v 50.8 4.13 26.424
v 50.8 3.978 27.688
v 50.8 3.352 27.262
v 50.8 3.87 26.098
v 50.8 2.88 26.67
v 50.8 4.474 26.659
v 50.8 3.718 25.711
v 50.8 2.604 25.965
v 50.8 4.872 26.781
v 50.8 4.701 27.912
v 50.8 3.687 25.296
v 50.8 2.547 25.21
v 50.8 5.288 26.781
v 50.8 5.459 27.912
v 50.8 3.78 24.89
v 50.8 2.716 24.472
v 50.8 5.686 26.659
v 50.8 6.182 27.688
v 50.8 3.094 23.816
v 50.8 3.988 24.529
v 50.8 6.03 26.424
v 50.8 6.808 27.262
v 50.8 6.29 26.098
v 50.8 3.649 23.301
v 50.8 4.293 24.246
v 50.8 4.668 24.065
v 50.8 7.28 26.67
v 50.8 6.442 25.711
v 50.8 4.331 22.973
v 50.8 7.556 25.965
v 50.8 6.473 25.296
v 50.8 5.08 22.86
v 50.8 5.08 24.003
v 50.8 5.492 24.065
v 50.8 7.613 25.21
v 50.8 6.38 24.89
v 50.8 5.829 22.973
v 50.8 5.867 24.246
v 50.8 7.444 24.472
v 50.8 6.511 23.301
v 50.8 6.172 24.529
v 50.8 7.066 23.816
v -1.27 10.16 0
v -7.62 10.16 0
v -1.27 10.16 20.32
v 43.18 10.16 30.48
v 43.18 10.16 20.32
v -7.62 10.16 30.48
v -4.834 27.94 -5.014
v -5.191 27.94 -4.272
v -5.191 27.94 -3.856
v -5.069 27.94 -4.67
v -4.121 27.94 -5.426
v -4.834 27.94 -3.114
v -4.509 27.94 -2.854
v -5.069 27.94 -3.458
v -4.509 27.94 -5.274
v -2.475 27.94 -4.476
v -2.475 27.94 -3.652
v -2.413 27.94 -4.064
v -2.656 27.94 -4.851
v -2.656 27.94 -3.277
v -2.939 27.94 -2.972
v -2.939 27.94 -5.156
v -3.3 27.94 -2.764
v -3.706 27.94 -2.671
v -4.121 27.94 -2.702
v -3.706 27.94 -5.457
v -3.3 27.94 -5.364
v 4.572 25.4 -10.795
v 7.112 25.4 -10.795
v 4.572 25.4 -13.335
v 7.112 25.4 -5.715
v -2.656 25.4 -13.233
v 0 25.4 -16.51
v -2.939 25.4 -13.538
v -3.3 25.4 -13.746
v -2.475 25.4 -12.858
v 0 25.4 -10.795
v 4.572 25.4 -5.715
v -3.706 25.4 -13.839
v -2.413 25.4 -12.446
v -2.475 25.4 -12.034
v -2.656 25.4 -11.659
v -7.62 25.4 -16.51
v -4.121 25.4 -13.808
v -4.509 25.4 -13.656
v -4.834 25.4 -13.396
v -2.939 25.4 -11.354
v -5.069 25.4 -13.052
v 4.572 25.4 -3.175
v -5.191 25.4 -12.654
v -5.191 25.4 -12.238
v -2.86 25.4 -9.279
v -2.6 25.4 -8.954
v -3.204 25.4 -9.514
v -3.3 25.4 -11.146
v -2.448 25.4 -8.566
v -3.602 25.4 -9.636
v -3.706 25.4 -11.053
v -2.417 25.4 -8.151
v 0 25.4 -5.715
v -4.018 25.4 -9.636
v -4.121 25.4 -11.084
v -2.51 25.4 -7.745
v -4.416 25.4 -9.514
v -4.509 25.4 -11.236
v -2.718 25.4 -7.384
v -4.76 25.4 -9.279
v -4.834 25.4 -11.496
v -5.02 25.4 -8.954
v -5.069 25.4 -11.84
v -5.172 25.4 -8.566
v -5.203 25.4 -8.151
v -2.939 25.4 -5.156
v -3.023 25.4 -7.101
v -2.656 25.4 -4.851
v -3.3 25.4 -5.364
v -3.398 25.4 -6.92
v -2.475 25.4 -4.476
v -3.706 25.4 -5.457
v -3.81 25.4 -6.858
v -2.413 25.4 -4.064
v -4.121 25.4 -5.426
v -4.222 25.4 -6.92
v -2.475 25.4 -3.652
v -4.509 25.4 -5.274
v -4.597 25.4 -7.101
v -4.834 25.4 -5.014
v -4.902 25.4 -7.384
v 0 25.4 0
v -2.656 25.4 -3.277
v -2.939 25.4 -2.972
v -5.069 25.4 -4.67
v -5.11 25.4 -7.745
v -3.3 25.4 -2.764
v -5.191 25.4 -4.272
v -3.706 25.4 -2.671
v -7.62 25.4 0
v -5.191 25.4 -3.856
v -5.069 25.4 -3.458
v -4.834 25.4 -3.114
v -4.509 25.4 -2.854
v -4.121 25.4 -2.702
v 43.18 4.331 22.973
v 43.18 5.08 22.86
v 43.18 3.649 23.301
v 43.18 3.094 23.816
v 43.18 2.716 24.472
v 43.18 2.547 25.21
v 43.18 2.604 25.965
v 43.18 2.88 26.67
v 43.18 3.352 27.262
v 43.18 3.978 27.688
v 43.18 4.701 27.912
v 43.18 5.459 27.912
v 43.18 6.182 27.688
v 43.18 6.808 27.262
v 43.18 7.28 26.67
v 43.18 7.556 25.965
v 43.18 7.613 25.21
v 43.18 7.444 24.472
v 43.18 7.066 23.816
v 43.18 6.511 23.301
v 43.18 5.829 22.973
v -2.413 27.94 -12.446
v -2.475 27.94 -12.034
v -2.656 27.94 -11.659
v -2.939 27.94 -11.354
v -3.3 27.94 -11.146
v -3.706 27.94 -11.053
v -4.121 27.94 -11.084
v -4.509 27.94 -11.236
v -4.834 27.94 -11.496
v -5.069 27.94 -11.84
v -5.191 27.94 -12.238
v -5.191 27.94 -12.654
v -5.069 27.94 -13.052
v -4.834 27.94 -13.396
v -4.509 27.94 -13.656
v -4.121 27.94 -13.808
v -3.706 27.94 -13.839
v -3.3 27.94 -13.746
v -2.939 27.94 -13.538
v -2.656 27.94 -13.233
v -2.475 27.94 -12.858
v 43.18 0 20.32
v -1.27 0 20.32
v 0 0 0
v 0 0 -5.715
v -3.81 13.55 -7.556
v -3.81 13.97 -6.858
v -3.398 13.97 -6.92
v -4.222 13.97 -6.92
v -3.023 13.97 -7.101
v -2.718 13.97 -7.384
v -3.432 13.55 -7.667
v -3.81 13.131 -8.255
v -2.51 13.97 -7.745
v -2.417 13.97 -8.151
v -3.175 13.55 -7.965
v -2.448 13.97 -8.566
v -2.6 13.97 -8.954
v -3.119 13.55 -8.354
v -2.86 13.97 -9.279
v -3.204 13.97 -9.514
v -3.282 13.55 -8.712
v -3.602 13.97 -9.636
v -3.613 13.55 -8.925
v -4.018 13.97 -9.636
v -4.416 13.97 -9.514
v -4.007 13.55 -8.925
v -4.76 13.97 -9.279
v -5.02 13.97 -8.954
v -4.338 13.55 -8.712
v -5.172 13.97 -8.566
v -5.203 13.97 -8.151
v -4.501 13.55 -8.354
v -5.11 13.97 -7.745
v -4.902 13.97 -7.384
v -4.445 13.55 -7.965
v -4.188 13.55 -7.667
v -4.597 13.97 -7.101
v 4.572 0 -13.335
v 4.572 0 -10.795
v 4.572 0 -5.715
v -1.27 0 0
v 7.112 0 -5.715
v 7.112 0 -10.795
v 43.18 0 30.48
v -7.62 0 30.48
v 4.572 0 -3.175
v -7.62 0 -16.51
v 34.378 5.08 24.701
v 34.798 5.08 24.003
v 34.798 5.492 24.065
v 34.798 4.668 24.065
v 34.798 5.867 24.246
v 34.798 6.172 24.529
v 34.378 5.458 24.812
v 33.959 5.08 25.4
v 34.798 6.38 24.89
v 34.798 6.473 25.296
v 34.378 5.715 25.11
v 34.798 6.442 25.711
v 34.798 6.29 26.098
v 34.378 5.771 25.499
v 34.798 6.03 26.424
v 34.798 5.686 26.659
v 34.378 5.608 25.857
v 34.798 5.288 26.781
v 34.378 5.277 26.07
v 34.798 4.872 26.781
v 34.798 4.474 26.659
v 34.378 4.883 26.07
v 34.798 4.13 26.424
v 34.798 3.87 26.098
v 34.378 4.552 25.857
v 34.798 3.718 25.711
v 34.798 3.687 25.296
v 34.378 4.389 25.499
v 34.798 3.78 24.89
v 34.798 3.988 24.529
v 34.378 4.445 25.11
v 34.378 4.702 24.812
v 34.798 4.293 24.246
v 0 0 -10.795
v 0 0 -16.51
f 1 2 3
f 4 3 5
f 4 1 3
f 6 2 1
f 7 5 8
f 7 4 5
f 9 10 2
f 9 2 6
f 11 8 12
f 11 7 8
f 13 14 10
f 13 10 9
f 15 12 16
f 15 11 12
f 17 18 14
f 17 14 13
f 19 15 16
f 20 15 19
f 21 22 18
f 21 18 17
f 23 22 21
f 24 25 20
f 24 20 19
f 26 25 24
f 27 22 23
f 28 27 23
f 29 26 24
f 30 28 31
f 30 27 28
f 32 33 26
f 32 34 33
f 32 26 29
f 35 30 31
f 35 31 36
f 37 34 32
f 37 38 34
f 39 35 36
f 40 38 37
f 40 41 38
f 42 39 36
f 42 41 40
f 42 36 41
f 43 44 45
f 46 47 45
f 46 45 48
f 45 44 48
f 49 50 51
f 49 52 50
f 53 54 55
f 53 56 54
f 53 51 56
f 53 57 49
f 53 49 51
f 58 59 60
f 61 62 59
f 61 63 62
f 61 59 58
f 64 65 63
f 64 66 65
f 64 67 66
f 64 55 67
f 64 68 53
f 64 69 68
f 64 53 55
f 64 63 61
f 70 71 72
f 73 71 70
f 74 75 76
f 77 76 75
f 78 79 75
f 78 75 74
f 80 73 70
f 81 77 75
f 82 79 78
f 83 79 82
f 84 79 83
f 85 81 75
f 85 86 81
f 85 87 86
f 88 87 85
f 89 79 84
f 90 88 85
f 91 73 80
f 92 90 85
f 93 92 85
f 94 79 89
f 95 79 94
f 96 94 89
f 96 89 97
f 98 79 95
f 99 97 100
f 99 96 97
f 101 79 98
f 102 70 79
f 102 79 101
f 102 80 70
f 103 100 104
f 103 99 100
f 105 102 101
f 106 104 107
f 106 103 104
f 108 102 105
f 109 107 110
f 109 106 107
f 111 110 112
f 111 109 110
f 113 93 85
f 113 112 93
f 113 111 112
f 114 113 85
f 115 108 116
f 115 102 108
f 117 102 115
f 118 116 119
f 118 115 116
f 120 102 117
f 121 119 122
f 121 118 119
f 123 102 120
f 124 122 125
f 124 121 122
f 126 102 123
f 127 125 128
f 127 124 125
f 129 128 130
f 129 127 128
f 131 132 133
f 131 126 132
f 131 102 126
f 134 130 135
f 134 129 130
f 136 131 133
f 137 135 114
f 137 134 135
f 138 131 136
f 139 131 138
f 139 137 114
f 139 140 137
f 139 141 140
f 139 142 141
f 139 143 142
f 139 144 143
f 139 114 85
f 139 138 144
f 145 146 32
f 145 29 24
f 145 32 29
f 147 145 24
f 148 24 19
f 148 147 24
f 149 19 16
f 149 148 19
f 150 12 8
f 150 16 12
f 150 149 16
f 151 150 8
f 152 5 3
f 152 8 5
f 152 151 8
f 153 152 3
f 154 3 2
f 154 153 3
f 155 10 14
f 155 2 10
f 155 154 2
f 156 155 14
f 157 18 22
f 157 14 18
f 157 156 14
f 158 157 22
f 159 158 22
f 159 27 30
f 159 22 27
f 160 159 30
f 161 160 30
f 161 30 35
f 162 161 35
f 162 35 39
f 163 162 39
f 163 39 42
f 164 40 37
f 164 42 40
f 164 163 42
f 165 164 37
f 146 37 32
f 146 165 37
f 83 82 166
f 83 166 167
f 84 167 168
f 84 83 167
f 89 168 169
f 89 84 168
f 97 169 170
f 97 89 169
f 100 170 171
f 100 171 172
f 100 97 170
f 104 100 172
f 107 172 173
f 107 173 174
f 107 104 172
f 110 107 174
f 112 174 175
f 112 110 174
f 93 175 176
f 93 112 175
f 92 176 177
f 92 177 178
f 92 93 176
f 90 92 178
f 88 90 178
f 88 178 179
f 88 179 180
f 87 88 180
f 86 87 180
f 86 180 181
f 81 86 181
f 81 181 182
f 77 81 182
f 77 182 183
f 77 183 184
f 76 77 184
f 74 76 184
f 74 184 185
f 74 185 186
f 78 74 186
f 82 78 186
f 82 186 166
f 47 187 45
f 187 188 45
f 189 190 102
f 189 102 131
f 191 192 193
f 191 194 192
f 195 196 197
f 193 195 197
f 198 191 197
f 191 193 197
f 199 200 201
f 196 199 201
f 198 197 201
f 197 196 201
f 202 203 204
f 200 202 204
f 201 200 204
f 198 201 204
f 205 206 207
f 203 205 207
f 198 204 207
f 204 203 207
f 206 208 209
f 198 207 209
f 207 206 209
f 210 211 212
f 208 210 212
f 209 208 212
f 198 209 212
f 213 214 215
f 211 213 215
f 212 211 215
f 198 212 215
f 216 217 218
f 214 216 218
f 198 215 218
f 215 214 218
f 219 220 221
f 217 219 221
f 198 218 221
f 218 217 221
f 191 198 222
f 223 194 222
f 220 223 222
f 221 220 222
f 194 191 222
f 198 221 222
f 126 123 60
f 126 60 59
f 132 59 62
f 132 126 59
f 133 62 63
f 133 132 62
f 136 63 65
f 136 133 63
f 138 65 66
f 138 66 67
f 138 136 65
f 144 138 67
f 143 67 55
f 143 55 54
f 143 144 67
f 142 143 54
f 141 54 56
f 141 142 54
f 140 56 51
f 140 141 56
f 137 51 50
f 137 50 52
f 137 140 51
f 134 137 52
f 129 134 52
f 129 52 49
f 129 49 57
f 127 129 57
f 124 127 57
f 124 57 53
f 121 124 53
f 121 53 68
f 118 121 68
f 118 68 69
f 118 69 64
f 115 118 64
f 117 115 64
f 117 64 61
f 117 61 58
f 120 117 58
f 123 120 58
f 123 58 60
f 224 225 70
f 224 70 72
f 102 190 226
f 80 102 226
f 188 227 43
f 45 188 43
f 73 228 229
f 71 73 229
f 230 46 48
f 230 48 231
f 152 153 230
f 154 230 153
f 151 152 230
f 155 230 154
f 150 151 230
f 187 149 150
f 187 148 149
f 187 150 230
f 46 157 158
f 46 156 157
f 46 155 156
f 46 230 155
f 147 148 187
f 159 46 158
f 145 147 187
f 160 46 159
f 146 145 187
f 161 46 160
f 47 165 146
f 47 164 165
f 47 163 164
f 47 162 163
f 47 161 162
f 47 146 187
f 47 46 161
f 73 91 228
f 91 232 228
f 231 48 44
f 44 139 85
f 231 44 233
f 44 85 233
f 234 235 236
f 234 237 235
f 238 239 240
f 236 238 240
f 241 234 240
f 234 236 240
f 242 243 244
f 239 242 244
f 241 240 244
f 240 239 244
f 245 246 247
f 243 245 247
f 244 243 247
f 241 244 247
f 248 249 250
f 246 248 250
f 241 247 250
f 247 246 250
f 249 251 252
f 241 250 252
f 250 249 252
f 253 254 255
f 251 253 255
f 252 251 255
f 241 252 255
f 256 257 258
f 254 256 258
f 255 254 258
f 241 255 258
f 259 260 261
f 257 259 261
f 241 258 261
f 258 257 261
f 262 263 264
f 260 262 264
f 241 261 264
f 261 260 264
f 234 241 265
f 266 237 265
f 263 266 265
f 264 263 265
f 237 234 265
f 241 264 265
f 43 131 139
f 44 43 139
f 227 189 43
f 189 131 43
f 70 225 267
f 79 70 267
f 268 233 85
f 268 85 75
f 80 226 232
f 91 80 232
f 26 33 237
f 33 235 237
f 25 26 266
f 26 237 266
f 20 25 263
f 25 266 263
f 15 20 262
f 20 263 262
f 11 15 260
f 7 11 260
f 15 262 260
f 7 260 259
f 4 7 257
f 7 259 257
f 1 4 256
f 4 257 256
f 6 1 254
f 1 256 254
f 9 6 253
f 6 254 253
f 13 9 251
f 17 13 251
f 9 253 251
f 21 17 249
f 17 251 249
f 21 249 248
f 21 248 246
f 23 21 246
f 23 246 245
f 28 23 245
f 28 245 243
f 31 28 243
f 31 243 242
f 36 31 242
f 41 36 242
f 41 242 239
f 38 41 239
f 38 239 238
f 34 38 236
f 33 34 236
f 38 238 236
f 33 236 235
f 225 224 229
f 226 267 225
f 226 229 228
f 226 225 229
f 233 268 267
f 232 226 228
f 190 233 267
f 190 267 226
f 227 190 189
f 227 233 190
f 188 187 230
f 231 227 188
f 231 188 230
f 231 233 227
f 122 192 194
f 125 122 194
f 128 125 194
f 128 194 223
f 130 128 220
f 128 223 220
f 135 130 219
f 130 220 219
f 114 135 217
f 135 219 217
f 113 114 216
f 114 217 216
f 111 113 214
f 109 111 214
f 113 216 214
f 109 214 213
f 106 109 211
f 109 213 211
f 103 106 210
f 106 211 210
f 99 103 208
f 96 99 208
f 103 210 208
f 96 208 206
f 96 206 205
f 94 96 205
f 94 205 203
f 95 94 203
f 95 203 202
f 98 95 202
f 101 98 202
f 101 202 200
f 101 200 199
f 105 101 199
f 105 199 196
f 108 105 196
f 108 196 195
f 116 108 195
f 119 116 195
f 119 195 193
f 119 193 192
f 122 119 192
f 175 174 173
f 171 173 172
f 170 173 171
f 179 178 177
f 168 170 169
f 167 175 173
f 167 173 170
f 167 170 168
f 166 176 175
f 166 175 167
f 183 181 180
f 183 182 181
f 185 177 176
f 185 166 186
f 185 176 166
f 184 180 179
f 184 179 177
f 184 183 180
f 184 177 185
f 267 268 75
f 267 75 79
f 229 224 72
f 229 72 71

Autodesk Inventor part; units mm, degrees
ref_plane "YZ Plane" through (0, 0, 0) normal (1, 0, 0) x (0, 1, 0)
ref_plane "XZ Plane" through (0, 0, 0) normal (0, 1, 0) x (-1, 0, 0)
ref_plane "XY Plane" through (0, 0, 0) normal (0, 0, 1) x (1, 0, 0)
sketch "Sketch1" plane through (0, 0, 0) normal (0, 1, 0) x (-1, 0, 0)
  line L0 (0, 0) -> (7.62, 0)
  line L1 (7.62, 0) -> (7.62, -16.51)
  line L2 (7.62, -16.51) -> (0, -16.51)
  line L3 (0, -16.51) -> (0, 0)
  line L4 (0, 0) -> (0, -5.715)
  line L5 (0, -5.715) -> (-7.112, -5.715)
  line L6 (-7.112, -5.715) -> (-7.112, -10.795)
  line L7 (-7.112, -10.795) -> (0, -10.795)
  line L8 (-7.112, -5.715) -> (-4.572, -5.715)
  line L9 (-4.572, -5.715) -> (-4.572, -3.175)
  line L10 (-4.572, -3.175) -> (-7.112, -5.715)
  line L11 (-7.112, -10.795) -> (-4.572, -10.795)
  line L12 (-4.572, -10.795) -> (-4.572, -13.335)
  line L13 (-4.572, -13.335) -> (-7.112, -10.795)
  dimension "d0" = 7.62
  dimension "d1" = 16.51
  dimension "d2" = 5.715
  dimension "d3" = 7.112
  dimension "d4" = 5.08
  dimension "d5" = 2.54
  dimension "d6" = 2.54
  dimension "d7" = 2.54
extrude "Extrusion1" add sketch "Sketch1" along normal blind 25.4
sketch "Sketch2" plane through (0, 25.4, 0) normal (0, 1, 0) x (1, 0, 0)
  line L0 (-7.62, 0) -> (0, 0) projected
  line L1 (-3.81, 0) -> (-3.81, 4.064)
  line L2 (0, 16.51) -> (-7.62, 16.51) projected
  line L3 (-3.81, 16.51) -> (-3.81, 12.446)
  circle A0 centre (-3.81, 4.064) radius 1.397
  circle A1 centre (-3.81, 12.446) radius 1.397
  dimension "d10" = 4.064
  dimension "d11" = 4.064
  dimension "d12" = 2.794
  dimension "d13" = 2.794
extrude "Extrusion2" add sketch "Sketch2" along normal blind 2.54
sketch "Sketch3" plane through (0, 25.4, 0) normal (0, 1, 0) x (1, 0, 0)
  line L0 (-7.62, 0) -> (0, 0) projected
  line L1 (-3.81, 0) -> (-3.81, 8.255)
  dimension "d16" = 8.255
hole "Hole1" at (-3.81, 25.4, -8.255) direction (0, -1, 0) diameter 2.794 depth 11.43 tip angle 118
sketch "Sketch8" plane through (-7.62, 0, 0) normal (0, 0, 1) x (1, 0, 0)
  line L0 (0, 0) -> (6.35, 0)
  line L1 (6.35, 0) -> (6.35, 10.16)
  line L2 (6.35, 10.16) -> (0, 10.16)
  line L3 (0, 10.16) -> (0, 0)
  point P0 (7.62, 0)
  dimension "d43" = 6.35
  dimension "d44" = 10.16
extrude "Extrusion6" add sketch "Sketch8" along normal blind 30.48
sketch "Sketch9" plane through (-1.27, 0, 0) normal (1, 0, 0) x (0, 0, -1)
  line L0 (16.51, 0) -> (-30.48, 0) projected
  line L1 (0, 10.16) -> (-30.48, 10.16) projected
  line L2 (-30.48, 0) -> (-20.32, 0)
  line L3 (-20.32, 0) -> (-20.32, 10.16)
  line L4 (-20.32, 10.16) -> (-30.48, 10.16)
  line L5 (-30.48, 10.16) -> (-30.48, 0)
  point P0 (0, 0)
  point P1 (46.99, 0)
  dimension "d47" = 10.16
extrude "Extrusion7" add sketch "Sketch9" along normal blind 44.45
sketch "Sketch10" plane through (43.18, 0, 0) normal (1, 0, 0) x (0, 0, -1)
  line L0 (-20.32, 10.16) -> (-20.32, 0) projected
  line L1 (-20.32, 5.08) -> (-25.4, 5.08)
  circle A0 centre (-25.4, 5.08) radius 2.54
  point P0 (0, 0)
  dimension "d50" = 5.08
  dimension "d51" = 5.08
extrude "Extrusion8" add sketch "Sketch10" along normal blind 7.62
sketch "Sketch11" plane through (50.8, 5.08, 25.4) normal (1, 0, 0) x (0, 0, -1)
  circle A0 centre (0, 0) radius 1.397
  point P0 (25.4, -5.08)
  dimension "d54" = 2.794
hole "Hole3" at (50.8, 5.08, 25.4) direction (-1, 0, 0) diameter 2.794 depth 16.002 tip angle 118
properties part number "Grab Rail v2"
